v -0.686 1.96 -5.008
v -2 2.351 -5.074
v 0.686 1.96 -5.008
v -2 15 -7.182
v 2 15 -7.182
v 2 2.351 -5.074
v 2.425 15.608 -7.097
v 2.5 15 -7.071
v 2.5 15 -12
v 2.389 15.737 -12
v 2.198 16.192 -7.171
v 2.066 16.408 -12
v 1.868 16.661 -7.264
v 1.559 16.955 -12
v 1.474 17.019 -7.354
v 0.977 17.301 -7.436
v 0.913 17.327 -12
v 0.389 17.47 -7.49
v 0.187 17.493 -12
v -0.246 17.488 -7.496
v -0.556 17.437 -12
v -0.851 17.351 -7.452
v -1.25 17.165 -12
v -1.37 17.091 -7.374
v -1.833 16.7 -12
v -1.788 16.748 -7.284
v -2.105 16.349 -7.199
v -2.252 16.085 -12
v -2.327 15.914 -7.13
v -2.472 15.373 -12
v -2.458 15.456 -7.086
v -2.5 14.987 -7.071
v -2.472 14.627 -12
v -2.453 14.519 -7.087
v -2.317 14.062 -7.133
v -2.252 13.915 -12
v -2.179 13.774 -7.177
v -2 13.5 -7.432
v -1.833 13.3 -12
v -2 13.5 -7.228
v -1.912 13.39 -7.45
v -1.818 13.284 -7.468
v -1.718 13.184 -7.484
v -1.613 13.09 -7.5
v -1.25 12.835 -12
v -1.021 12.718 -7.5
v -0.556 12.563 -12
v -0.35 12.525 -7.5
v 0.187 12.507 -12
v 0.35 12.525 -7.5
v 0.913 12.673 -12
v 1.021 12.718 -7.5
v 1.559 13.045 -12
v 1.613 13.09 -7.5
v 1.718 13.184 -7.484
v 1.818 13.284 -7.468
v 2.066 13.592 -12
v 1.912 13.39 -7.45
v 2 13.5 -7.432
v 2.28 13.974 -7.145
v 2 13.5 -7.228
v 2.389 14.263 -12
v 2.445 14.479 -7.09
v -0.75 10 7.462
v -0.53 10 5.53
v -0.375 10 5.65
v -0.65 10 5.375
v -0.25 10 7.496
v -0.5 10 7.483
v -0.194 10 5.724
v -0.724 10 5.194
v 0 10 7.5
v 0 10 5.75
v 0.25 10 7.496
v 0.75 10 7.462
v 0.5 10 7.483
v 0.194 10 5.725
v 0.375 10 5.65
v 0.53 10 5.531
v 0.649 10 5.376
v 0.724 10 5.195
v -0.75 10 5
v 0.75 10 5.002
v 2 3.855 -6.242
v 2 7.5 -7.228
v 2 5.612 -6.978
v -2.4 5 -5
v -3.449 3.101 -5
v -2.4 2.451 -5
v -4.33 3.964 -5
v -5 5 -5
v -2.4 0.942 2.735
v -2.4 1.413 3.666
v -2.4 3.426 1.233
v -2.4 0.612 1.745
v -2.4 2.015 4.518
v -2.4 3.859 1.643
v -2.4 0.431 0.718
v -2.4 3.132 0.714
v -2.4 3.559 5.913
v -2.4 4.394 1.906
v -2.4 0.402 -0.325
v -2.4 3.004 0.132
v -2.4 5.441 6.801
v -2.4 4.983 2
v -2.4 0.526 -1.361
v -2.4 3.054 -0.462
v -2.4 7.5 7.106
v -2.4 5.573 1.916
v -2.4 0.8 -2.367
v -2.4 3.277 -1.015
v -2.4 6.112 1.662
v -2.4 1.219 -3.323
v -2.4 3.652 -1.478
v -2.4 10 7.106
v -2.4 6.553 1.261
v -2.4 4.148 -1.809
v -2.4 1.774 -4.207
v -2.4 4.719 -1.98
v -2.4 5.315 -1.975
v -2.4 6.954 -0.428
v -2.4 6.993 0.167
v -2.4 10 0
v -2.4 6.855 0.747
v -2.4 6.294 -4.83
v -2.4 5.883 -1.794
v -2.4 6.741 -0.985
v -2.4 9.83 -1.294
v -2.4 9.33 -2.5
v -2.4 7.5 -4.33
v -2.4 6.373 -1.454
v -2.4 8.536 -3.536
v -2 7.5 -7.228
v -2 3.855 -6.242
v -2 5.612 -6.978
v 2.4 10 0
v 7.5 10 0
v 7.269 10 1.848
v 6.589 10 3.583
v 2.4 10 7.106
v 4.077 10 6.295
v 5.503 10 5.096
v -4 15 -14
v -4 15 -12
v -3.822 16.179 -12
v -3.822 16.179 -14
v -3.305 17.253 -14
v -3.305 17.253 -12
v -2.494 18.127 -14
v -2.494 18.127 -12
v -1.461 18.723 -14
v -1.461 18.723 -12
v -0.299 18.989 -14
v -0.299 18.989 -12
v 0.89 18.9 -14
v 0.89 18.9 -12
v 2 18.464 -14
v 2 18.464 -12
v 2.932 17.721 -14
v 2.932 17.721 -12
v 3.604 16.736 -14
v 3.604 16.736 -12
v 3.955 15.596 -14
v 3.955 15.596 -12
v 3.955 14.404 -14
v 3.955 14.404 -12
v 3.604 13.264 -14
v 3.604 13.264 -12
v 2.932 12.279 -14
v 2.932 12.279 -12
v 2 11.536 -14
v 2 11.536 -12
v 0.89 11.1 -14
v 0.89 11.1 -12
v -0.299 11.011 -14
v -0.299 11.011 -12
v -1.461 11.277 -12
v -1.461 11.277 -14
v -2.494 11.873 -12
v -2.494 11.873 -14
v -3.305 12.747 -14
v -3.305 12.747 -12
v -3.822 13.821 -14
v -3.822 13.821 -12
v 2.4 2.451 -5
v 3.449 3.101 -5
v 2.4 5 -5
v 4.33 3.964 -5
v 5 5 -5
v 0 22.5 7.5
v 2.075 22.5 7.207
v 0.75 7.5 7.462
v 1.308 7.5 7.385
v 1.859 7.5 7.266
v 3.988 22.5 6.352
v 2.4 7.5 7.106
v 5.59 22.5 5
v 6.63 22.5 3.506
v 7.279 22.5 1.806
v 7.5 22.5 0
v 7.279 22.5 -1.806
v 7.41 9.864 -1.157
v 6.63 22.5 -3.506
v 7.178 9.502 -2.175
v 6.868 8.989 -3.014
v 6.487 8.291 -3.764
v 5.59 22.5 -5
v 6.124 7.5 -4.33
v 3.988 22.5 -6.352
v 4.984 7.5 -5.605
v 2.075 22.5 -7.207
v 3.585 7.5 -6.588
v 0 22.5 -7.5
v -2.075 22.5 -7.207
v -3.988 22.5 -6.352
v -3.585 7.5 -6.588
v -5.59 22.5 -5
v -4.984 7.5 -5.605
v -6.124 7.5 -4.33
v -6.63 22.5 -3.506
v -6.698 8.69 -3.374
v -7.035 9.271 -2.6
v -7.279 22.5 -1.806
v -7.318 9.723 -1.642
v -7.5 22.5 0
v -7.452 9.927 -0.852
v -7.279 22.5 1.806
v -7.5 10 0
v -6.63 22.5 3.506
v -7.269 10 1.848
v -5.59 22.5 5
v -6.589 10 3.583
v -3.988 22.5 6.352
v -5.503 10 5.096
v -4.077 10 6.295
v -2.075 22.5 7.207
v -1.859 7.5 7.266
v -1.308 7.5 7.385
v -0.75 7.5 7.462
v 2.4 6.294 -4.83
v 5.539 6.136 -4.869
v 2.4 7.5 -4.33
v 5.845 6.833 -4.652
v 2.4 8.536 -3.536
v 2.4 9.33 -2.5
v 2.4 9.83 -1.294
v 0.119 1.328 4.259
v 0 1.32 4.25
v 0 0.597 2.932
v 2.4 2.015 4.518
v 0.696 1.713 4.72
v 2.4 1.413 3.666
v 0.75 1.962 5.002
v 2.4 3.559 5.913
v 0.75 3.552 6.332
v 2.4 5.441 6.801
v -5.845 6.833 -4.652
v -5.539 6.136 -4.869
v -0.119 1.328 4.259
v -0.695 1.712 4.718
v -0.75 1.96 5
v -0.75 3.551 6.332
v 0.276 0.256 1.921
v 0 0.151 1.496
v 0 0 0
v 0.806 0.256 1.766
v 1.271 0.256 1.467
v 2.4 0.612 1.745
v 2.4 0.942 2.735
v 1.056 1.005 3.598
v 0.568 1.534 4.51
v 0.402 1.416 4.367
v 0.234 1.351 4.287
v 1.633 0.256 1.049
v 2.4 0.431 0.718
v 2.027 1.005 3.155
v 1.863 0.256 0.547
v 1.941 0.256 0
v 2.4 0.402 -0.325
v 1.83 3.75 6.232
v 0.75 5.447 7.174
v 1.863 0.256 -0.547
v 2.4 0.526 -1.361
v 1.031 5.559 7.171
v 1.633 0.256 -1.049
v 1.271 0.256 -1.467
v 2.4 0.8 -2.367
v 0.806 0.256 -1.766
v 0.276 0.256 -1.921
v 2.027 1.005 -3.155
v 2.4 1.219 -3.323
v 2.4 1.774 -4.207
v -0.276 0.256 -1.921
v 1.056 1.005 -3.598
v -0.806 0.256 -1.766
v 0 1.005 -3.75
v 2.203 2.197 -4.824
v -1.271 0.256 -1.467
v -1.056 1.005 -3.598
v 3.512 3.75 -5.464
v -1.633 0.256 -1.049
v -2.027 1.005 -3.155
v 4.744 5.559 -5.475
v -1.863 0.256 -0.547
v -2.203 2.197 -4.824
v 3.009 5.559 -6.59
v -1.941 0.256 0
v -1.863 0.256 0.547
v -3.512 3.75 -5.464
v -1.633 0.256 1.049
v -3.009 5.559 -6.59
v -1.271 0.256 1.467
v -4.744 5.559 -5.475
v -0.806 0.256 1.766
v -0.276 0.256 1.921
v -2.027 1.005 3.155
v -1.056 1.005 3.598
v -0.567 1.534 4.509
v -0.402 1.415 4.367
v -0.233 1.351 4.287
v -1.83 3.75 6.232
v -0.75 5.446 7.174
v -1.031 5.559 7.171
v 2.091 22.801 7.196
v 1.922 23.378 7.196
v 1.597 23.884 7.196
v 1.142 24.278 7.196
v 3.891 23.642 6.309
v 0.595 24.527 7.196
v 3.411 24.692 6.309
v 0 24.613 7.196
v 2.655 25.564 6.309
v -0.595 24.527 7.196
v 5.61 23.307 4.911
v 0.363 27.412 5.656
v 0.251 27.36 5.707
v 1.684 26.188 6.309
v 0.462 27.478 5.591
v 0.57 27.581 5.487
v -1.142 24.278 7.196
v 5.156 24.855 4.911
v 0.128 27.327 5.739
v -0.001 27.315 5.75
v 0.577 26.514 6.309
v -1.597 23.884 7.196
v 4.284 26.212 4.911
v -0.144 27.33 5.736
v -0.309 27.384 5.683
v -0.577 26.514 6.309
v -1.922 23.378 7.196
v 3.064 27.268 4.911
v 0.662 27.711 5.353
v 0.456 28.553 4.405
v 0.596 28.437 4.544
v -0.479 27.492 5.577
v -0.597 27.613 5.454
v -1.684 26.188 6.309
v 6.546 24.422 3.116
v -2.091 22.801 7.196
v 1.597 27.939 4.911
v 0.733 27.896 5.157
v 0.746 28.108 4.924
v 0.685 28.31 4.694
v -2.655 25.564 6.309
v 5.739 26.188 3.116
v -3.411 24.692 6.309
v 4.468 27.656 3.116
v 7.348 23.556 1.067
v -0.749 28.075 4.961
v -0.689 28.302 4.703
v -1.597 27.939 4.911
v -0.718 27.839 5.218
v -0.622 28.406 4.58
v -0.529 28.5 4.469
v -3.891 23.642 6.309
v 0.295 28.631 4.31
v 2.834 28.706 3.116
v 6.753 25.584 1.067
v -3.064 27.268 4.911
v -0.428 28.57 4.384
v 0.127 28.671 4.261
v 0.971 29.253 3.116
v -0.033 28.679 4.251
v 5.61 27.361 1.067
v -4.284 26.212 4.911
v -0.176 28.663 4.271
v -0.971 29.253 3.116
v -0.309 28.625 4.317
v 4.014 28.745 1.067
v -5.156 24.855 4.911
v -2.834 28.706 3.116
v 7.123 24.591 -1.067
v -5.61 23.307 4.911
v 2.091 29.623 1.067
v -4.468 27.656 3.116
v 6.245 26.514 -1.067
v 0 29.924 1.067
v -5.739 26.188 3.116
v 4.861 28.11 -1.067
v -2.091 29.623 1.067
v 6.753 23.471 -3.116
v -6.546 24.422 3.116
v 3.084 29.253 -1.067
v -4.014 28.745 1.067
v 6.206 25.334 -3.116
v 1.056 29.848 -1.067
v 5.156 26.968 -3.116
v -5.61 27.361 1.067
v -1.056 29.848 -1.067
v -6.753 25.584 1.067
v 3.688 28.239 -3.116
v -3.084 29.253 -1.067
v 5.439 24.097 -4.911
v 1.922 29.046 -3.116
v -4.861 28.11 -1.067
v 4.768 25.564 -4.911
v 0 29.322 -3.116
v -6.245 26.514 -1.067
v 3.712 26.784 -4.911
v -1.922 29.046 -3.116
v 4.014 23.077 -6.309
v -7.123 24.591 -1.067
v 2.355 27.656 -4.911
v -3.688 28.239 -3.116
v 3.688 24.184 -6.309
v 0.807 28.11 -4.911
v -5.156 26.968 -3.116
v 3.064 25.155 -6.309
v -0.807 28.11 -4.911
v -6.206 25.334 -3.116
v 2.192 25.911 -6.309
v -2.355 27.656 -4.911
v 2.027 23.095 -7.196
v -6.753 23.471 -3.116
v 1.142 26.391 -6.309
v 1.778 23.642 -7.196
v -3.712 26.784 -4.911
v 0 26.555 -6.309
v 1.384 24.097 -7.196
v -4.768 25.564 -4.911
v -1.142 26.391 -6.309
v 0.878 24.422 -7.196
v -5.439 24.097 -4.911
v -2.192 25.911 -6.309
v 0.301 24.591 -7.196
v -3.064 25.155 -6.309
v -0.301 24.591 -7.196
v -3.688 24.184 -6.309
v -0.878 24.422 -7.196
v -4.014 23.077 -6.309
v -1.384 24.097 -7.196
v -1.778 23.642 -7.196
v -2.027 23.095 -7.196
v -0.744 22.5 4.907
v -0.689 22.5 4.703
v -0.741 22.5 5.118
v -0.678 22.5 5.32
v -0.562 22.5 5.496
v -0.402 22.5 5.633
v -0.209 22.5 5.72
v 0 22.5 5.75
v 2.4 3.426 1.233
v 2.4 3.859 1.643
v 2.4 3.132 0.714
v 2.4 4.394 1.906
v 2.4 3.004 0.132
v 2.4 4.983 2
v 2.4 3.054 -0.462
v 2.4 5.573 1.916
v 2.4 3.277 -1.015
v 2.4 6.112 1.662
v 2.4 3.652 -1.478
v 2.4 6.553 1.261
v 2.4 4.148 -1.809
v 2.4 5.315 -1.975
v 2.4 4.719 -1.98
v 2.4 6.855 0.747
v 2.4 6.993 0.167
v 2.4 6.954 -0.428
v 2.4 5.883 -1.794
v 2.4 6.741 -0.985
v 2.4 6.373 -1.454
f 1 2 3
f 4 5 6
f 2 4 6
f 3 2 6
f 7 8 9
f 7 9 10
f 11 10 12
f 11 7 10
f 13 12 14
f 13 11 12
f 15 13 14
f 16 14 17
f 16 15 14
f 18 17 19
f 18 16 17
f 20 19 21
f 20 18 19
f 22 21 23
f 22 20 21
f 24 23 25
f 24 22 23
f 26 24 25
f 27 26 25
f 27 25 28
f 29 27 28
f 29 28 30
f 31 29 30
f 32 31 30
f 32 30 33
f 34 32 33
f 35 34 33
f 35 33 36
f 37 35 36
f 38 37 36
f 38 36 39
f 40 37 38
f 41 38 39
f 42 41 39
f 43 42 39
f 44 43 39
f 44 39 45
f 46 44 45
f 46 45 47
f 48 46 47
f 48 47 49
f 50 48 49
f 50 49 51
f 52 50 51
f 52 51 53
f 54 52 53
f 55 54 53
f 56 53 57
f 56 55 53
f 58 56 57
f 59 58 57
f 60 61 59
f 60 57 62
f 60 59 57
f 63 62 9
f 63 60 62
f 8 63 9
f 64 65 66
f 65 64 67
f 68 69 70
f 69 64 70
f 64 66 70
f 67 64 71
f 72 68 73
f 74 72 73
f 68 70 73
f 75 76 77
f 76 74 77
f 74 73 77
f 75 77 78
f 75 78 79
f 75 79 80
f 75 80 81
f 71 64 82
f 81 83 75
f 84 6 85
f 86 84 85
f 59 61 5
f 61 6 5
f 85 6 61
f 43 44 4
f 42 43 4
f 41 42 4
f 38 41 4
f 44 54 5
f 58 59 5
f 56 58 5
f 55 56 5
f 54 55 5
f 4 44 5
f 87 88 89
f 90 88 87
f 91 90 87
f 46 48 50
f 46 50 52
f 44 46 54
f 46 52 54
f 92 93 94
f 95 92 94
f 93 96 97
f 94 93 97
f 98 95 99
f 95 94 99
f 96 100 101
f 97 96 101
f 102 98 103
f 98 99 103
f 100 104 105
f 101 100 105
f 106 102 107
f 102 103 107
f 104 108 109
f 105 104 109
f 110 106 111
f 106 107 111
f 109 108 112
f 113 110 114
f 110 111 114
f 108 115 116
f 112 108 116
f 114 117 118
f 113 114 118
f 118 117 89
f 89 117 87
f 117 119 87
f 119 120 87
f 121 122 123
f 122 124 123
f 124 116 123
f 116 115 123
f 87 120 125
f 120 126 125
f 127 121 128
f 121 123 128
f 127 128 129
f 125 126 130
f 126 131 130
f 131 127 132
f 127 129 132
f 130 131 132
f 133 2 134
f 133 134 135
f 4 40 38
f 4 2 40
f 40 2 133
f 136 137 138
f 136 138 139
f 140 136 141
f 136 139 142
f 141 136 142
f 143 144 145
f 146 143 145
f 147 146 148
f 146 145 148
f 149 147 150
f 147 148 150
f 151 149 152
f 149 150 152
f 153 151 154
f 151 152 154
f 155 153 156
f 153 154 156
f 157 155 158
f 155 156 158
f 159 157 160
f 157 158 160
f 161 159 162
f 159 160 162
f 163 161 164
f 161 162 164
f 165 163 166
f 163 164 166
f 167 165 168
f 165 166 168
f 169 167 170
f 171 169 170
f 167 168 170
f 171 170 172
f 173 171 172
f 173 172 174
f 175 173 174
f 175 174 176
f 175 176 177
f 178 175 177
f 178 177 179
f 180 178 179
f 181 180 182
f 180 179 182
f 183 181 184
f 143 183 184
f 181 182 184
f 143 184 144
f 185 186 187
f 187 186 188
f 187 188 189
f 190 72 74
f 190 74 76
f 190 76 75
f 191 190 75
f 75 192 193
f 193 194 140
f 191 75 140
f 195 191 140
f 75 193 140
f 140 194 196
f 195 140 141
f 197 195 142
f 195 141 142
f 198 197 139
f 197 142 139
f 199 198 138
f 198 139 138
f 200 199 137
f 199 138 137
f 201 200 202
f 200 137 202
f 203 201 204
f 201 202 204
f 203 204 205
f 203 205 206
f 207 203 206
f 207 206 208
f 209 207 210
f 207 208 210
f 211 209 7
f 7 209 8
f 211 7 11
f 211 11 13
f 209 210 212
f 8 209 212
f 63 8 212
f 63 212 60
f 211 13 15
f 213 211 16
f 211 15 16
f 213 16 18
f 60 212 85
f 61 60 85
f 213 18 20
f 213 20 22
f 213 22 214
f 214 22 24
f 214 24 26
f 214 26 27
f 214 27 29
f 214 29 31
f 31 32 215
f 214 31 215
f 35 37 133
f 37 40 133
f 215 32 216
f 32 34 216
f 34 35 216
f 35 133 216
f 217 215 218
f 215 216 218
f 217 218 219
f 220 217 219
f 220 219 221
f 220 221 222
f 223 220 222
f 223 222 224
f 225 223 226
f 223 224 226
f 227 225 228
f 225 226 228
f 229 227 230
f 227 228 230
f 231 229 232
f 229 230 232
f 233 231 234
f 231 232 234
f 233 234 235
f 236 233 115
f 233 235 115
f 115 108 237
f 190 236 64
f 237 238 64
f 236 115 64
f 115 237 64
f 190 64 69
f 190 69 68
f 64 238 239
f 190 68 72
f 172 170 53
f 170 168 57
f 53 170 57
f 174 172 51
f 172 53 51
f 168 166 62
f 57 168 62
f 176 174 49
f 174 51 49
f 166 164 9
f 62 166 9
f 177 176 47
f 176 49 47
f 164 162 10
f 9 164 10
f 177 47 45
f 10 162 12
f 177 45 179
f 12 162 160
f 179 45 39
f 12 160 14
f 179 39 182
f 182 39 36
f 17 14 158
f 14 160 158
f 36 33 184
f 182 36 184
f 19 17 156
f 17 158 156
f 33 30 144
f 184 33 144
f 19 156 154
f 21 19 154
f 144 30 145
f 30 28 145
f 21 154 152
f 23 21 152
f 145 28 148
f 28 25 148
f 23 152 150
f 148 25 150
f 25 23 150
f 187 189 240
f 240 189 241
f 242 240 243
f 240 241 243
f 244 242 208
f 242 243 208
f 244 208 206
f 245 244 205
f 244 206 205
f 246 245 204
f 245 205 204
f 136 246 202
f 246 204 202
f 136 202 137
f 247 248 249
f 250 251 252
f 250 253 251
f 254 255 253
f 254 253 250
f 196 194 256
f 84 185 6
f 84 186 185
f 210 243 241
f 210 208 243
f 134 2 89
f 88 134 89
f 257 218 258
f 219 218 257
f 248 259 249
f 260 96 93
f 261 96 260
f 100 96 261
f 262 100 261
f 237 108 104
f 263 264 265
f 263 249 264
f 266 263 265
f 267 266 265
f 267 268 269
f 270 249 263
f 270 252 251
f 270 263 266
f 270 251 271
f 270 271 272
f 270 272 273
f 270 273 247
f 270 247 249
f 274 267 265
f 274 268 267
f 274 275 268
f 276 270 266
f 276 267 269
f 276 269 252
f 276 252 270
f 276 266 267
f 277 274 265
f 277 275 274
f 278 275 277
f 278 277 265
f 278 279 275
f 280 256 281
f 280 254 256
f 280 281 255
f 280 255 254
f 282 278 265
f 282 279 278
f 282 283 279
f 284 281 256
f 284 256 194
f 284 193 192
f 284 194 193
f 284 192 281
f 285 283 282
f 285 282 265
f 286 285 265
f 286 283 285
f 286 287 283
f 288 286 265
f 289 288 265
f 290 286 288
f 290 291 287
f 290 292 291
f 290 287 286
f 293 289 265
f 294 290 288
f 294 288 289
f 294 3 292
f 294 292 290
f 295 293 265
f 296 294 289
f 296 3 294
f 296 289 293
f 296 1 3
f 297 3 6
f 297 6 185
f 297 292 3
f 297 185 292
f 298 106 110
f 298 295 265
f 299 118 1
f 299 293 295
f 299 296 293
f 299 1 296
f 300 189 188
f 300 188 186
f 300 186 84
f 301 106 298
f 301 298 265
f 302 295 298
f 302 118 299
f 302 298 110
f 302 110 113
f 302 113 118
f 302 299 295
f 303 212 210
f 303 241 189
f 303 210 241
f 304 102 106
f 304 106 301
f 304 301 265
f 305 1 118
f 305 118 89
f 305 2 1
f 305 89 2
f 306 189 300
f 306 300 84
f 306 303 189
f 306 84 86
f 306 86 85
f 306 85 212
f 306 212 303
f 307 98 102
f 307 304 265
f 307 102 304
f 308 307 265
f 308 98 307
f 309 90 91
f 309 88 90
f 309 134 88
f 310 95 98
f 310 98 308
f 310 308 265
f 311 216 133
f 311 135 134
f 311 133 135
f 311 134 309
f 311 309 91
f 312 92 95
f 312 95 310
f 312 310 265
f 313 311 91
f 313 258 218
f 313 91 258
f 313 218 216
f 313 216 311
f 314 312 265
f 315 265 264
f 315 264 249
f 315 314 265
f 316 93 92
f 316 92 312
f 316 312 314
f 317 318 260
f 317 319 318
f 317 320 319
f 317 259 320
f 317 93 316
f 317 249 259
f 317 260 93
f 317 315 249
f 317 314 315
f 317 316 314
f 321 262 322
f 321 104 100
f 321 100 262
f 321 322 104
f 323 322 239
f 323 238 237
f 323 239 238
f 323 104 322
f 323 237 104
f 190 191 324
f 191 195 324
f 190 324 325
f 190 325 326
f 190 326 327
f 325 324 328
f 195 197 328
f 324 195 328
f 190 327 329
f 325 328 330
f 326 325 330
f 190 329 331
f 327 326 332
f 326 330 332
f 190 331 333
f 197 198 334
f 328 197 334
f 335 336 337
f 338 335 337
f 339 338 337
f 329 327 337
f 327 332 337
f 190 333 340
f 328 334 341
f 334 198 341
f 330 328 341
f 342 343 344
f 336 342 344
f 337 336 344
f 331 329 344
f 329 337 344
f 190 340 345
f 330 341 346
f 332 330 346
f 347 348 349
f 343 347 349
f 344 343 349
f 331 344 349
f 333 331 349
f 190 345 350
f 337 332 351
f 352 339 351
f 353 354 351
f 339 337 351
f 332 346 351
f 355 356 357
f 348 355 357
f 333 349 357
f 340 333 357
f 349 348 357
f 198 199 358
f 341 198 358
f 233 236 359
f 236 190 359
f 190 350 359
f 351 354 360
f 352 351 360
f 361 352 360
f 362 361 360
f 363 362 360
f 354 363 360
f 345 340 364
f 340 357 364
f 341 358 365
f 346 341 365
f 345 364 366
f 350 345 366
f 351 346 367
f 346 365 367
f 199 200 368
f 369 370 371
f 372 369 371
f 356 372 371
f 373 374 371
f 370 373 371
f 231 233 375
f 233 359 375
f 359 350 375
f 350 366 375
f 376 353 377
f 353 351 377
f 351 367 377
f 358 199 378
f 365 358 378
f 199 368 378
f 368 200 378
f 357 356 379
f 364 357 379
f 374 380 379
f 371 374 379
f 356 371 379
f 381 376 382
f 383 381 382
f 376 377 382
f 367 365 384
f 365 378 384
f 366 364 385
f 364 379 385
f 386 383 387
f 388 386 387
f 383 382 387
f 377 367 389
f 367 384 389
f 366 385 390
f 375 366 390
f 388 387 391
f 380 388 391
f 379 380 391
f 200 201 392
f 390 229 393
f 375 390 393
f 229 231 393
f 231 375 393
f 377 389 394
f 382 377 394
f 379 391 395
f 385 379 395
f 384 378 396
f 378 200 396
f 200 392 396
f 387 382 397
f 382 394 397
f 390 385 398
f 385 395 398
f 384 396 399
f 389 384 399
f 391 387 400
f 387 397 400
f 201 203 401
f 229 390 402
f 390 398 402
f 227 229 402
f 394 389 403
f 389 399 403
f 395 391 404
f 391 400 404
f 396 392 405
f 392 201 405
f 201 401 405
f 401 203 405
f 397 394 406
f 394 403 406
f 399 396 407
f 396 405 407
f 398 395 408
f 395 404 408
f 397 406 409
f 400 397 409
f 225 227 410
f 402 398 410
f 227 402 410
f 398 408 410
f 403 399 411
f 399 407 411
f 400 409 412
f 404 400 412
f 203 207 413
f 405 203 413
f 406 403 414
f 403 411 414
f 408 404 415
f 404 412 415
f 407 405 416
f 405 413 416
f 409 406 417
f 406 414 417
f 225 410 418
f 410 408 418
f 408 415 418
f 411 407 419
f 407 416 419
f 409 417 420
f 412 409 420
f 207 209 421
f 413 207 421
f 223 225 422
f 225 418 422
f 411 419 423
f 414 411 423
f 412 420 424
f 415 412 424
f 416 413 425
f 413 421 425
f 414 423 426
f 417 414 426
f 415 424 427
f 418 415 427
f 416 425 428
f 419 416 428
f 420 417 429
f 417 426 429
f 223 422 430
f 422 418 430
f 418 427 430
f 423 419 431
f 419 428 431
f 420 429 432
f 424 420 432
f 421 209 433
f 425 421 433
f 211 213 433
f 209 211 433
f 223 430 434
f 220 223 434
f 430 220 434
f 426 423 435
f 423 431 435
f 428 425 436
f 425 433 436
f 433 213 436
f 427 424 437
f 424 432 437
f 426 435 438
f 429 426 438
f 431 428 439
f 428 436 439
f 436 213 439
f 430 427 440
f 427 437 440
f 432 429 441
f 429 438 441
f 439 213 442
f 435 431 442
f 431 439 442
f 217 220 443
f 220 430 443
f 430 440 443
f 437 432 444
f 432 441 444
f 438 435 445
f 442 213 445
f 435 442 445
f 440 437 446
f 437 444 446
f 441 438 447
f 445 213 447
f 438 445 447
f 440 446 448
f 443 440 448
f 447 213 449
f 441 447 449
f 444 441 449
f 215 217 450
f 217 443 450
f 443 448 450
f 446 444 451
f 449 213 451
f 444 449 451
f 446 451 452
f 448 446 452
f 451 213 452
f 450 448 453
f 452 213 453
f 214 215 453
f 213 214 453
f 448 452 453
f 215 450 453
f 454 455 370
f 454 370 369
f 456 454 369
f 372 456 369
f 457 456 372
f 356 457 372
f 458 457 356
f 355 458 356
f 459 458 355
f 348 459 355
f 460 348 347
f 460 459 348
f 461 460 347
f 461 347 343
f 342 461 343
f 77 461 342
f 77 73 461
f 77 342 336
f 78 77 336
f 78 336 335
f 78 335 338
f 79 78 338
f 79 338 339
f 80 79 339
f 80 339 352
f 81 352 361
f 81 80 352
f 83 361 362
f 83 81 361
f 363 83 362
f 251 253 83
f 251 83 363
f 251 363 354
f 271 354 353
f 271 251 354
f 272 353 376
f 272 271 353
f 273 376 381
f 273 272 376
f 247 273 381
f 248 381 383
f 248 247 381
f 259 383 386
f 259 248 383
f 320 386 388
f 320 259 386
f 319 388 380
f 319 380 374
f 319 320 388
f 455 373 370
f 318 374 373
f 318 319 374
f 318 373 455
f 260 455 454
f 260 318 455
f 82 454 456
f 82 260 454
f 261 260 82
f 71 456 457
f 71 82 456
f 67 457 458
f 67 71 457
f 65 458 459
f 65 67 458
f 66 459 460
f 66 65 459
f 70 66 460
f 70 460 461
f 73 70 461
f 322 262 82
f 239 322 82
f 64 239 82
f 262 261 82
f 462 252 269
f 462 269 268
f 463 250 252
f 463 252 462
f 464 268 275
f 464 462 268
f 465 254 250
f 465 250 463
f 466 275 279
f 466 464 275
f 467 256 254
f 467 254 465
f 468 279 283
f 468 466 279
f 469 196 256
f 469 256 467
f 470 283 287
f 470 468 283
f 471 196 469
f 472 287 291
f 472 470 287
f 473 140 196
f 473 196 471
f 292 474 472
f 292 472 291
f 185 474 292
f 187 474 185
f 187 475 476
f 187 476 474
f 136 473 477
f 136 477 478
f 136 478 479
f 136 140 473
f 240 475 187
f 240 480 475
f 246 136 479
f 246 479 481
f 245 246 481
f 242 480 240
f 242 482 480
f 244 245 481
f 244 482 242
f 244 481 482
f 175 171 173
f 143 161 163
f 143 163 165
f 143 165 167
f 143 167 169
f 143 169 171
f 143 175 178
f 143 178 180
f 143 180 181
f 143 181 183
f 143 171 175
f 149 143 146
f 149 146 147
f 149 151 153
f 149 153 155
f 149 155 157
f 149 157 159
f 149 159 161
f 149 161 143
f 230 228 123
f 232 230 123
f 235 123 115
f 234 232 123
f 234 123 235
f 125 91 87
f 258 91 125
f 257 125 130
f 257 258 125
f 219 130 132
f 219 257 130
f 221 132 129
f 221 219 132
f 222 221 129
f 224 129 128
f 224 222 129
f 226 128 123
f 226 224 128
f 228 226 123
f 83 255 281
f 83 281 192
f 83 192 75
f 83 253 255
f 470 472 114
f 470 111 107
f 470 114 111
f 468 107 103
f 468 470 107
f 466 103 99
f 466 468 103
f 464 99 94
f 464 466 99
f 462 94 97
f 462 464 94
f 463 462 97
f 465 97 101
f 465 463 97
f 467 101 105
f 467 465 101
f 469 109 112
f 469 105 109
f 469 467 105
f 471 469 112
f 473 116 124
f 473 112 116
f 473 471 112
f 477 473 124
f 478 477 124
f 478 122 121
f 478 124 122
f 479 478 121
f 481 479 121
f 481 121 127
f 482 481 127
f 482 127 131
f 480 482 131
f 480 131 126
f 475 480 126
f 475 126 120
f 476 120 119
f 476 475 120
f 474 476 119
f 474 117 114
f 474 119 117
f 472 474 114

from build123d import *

# Parameters (mm, degrees)
SKETCH1_R               = 7.5
SKETCH1_R_2             = 0.75
BOSS_EXTRUDE1_DEPTH     = 30
FILLET4_R               = 7.5
SKETCH2_W               = 3.090169944
SKETCH2_H               = 10
BOSS_EXTRUDE2_DEPTH     = 20
SKETCH3_R               = 2
CUT_EXTRUDE1_DEPTH      = 45.300112867
CUT_EXTRUDE4_START      = -45.300113002
SKETCH7_R               = 2
CUT_EXTRUDE4_DEPTH      = 45.400113002
CUT_EXTRUDE5_DEPTH      = 45.300113002
CUT_EXTRUDE5_DEPTH_BACK = 45.300113002
SKETCH7_2_R             = 2
CUT_EXTRUDE8_REACH      = 46.3
SKETCH15_R              = 2.5
BOSS_EXTRUDE3_DEPTH     = 12
SKETCH16_R              = 4
BOSS_EXTRUDE4_DEPTH     = 2
SKETCH13_W              = 1.5
SKETCH13_H              = 8.04181095
CUT_EXTRUDE14_DEPTH     = 48.154003117
SKETCH10_R              = 7.5
CUT_EXTRUDE11_DEPTH     = 28.540878735
REVOLVE1_ANGLE          = 180
SKETCH1_2_R             = 0.75
CUT_EXTRUDE12_DEPTH     = 34.944808167
CUT_EXTRUDE16_DEPTH     = 2


with BuildPart() as part:
    # Sketch1 → Boss-Extrude1 (new body)
    with BuildSketch(Plane(origin=(0, 0, 0), x_dir=(1, 0, 0), z_dir=(0, 1, 0))):
        with Locations(Location((0, 0, 0), (0, 0, 270))):
            Circle(SKETCH1_R)
        with Locations(Location((0, -5, 0), (0, 0, 270))):
            Circle(SKETCH1_R_2, mode=Mode.SUBTRACT)
    extrude(amount=BOSS_EXTRUDE1_DEPTH)

    # Fillet4
    # the kernel refuses this fillet: 7.5 mm, written as the material it takes off along each edge
    with BuildSketch(Plane(origin=(0, 0, 0), x_dir=(0, 0, 1), z_dir=(-1, 0, 0))) as fillet4_piece_1:
        with BuildLine():
            CenterArc((7.5 - FILLET4_R, FILLET4_R), FILLET4_R, 270, 90)
            Line((7.5 - FILLET4_R, 0), (7.5, 0))
            Line((7.5, 0), (7.5, FILLET4_R))
        make_face()
    revolve(axis=Axis((0, 0, 0), (0, 1, 0)), mode=Mode.SUBTRACT)
    with BuildSketch(Plane(origin=(0, 30, 0), x_dir=(0, 0, 1), z_dir=(-1, 0, 0))) as fillet4_piece_2:
        with BuildLine():
            CenterArc((7.5 - FILLET4_R, -FILLET4_R), FILLET4_R, 0, 90)
            Line((7.5 - FILLET4_R, 0), (7.5, 0))
            Line((7.5, 0), (7.5, -FILLET4_R))
        make_face()
    revolve(axis=Axis((0, 30, 0), (0, 1, 0)), mode=Mode.SUBTRACT)

    # Sketch2 → Boss-Extrude2 (add)
    with BuildSketch(Plane(origin=(0, 22.5, 0), x_dir=(1, 0, 0), z_dir=(0, 1, 0))):
        with Locations((4.045084972, 0)):
            Rectangle(SKETCH2_W, SKETCH2_H)
        with BuildLine():
            ThreePointArc((5.590169944, -5), (7.5, 0), (5.590169944, 5))
            Line((5.590169944, 5), (5.590169944, -5))
        make_face()
    boss_extrude2 = extrude(amount=BOSS_EXTRUDE2_DEPTH)

    # Sketch3 → Cut-Extrude1 (cut, symmetric)
    with BuildSketch(Plane.ZY.offset(-2.5)):
        with BuildLine():
            ThreePointArc((-5, 37.5), (-3.535533906, 41.035533906), (0, 42.5))
            Line((0, 42.5), (-5, 42.5))
            Line((-5, 42.5), (-5, 37.5))
        make_face()
        with BuildLine():
            ThreePointArc((0, 42.5), (3.535533906, 41.035533906), (5, 37.5))
            Line((5, 37.5), (5, 42.5))
            Line((5, 42.5), (0, 42.5))
        make_face()
        with Locations(Location((0, 37.5, 0), (0, 0, 270))):
            Circle(SKETCH3_R)
    cut_extrude1 = extrude(amount=CUT_EXTRUDE1_DEPTH, both=True, mode=Mode.SUBTRACT)

    # Sketch7 → Cut-Extrude4 (cut)
    with BuildSketch(Plane.ZY.offset(-2.5).offset(CUT_EXTRUDE4_START)):
        with BuildLine():
            Line((0, 10), (7.5, 10))
            Line((7.5, 10), (7.5, 0))
            Line((7.5, 0), (-5, 0))
            Line((-5, 0), (-5, 5))
            ThreePointArc((-5, 5), (-3.535533906, 8.535533906), (0, 10))
        make_face()
        with Locations(Location((0, 5, 0), (0, 0, 230.136383732))):
            Circle(SKETCH7_R, mode=Mode.SUBTRACT)
    cut_extrude4 = extrude(amount=CUT_EXTRUDE4_DEPTH, mode=Mode.SUBTRACT)

    # Sketch7<2> → Cut-Extrude5 (cut, two sides: drawn at the far end of the back side and taken through both)
    with BuildSketch(Plane.ZY.offset(-2.5).offset(-CUT_EXTRUDE5_DEPTH_BACK)):
        with Locations(Location((0, 5, 0), (0, 0, 222.357273293))):
            Circle(SKETCH7_2_R)
    extrude(amount=CUT_EXTRUDE5_DEPTH + CUT_EXTRUDE5_DEPTH_BACK, mode=Mode.SUBTRACT)

    # Mirror1: Boss-Extrude2, Cut-Extrude1, Cut-Extrude4 across plane
    add(boss_extrude2.mirror(Plane(origin=(0, 0, 0), x_dir=(0, 0, 1), z_dir=(1, 0, 0))))
    add(cut_extrude1.mirror(Plane(origin=(0, 0, 0), x_dir=(0, 0, 1), z_dir=(1, 0, 0))), mode=Mode.SUBTRACT)
    add(cut_extrude4.mirror(Plane(origin=(0, 0, 0), x_dir=(0, 0, 1), z_dir=(1, 0, 0))), mode=Mode.SUBTRACT)

    # Cut-Extrude8: up to this face of the body (flat: up to its plane)
    cut_extrude8_end = Plane(part.part.faces().sort_by_distance((-2.5, 34.956709536, 0))[0])
    # Sketch9 → Cut-Extrude8 (cut, up to the picked face)
    with BuildSketch(Plane.ZY.offset(-2.5), mode=Mode.PRIVATE) as cut_extrude8_sk1:
        with BuildLine():
            Line((5, 27.5), (22.867472592, 27.5))
            Line((22.867472592, 27.5), (22.867472592, 37.5))
            Line((22.867472592, 37.5), (-5, 37.5))
            ThreePointArc((-5, 37.5), (-2.071067812, 30.428932188), (5, 27.5))
        make_face()
    cut_extrude8_tool1 = split(extrude(cut_extrude8_sk1.sketch, amount=CUT_EXTRUDE8_REACH, mode=Mode.PRIVATE), bisect_by=cut_extrude8_end, keep=Keep.BOTH, mode=Mode.PRIVATE)
    add(cut_extrude8_tool1.solids().sort_by(Axis((2.5, 32.730802, 9.909907), (-1, 0, 0)))[0], mode=Mode.SUBTRACT)

    # Sketch15 → Boss-Extrude3 (add)
    with BuildSketch(Plane.XY):
        with Locations((0, 15)):
            Circle(SKETCH15_R)
    extrude(amount=-BOSS_EXTRUDE3_DEPTH)

    # Sketch16 → Boss-Extrude4 (add)
    with BuildSketch(Plane(origin=(0, 0, -12), x_dir=(-1, 0, 0), z_dir=(0, 0, -1))):
        with Locations((0, 15)):
            Circle(SKETCH16_R)
    extrude(amount=BOSS_EXTRUDE4_DEPTH)

    # Sketch13 → Cut-Extrude14 (cut, through all)
    with BuildSketch(Plane.XY.offset(5)):
        with Locations((-1.855e-06, 5.979094525)):
            Rectangle(SKETCH13_W, SKETCH13_H)
    extrude(amount=CUT_EXTRUDE14_DEPTH, mode=Mode.SUBTRACT)

    # Sketch10 → Cut-Extrude11 (cut, through all)
    with BuildSketch(Plane(origin=(0, 22.5, 0), x_dir=(1, 0, 0), z_dir=(0, 1, 0))):
        with Locations(Location((0, 0, 0), (0, 0, 90))):
            Circle(SKETCH10_R)
    extrude(amount=CUT_EXTRUDE11_DEPTH, mode=Mode.SUBTRACT)

    # Sketch11 → Revolve1 (revolve)
    with BuildSketch(Plane(origin=(0, 22.5, 0), x_dir=(1, 0, 0), z_dir=(0, 1, 0))):
        with BuildLine():
            Line((0, 7.5), (0, -7.5))
            ThreePointArc((0, -7.5), (7.5, 0), (0, 7.5))
        make_face()
    revolve(axis=Axis((0, 22.5, -7.5), (0, 0, 1)), revolution_arc=REVOLVE1_ANGLE)

    # Sketch1<2> → Cut-Extrude12 (cut, through all)
    with BuildSketch(Plane(origin=(0, 0, 0), x_dir=(1, 0, 0), z_dir=(0, 1, 0))):
        with Locations(Location((0, -5, 0), (0, 0, 156.648060809))):
            Circle(SKETCH1_2_R)
    extrude(amount=CUT_EXTRUDE12_DEPTH, mode=Mode.SUBTRACT)

    # Sketch14<2> → Cut-Extrude16 (cut, symmetric)
    with BuildSketch(Plane(origin=(0, 0, 0), x_dir=(0, 0, -1), z_dir=(1, 0, 0))):
        Polygon((7.5, 1.909830056), (7.5, 13.090169944), (7.181694991, 15), (5, 1.909830056), align=None)
    extrude(amount=CUT_EXTRUDE16_DEPTH, both=True, mode=Mode.SUBTRACT)


solid = part.part
